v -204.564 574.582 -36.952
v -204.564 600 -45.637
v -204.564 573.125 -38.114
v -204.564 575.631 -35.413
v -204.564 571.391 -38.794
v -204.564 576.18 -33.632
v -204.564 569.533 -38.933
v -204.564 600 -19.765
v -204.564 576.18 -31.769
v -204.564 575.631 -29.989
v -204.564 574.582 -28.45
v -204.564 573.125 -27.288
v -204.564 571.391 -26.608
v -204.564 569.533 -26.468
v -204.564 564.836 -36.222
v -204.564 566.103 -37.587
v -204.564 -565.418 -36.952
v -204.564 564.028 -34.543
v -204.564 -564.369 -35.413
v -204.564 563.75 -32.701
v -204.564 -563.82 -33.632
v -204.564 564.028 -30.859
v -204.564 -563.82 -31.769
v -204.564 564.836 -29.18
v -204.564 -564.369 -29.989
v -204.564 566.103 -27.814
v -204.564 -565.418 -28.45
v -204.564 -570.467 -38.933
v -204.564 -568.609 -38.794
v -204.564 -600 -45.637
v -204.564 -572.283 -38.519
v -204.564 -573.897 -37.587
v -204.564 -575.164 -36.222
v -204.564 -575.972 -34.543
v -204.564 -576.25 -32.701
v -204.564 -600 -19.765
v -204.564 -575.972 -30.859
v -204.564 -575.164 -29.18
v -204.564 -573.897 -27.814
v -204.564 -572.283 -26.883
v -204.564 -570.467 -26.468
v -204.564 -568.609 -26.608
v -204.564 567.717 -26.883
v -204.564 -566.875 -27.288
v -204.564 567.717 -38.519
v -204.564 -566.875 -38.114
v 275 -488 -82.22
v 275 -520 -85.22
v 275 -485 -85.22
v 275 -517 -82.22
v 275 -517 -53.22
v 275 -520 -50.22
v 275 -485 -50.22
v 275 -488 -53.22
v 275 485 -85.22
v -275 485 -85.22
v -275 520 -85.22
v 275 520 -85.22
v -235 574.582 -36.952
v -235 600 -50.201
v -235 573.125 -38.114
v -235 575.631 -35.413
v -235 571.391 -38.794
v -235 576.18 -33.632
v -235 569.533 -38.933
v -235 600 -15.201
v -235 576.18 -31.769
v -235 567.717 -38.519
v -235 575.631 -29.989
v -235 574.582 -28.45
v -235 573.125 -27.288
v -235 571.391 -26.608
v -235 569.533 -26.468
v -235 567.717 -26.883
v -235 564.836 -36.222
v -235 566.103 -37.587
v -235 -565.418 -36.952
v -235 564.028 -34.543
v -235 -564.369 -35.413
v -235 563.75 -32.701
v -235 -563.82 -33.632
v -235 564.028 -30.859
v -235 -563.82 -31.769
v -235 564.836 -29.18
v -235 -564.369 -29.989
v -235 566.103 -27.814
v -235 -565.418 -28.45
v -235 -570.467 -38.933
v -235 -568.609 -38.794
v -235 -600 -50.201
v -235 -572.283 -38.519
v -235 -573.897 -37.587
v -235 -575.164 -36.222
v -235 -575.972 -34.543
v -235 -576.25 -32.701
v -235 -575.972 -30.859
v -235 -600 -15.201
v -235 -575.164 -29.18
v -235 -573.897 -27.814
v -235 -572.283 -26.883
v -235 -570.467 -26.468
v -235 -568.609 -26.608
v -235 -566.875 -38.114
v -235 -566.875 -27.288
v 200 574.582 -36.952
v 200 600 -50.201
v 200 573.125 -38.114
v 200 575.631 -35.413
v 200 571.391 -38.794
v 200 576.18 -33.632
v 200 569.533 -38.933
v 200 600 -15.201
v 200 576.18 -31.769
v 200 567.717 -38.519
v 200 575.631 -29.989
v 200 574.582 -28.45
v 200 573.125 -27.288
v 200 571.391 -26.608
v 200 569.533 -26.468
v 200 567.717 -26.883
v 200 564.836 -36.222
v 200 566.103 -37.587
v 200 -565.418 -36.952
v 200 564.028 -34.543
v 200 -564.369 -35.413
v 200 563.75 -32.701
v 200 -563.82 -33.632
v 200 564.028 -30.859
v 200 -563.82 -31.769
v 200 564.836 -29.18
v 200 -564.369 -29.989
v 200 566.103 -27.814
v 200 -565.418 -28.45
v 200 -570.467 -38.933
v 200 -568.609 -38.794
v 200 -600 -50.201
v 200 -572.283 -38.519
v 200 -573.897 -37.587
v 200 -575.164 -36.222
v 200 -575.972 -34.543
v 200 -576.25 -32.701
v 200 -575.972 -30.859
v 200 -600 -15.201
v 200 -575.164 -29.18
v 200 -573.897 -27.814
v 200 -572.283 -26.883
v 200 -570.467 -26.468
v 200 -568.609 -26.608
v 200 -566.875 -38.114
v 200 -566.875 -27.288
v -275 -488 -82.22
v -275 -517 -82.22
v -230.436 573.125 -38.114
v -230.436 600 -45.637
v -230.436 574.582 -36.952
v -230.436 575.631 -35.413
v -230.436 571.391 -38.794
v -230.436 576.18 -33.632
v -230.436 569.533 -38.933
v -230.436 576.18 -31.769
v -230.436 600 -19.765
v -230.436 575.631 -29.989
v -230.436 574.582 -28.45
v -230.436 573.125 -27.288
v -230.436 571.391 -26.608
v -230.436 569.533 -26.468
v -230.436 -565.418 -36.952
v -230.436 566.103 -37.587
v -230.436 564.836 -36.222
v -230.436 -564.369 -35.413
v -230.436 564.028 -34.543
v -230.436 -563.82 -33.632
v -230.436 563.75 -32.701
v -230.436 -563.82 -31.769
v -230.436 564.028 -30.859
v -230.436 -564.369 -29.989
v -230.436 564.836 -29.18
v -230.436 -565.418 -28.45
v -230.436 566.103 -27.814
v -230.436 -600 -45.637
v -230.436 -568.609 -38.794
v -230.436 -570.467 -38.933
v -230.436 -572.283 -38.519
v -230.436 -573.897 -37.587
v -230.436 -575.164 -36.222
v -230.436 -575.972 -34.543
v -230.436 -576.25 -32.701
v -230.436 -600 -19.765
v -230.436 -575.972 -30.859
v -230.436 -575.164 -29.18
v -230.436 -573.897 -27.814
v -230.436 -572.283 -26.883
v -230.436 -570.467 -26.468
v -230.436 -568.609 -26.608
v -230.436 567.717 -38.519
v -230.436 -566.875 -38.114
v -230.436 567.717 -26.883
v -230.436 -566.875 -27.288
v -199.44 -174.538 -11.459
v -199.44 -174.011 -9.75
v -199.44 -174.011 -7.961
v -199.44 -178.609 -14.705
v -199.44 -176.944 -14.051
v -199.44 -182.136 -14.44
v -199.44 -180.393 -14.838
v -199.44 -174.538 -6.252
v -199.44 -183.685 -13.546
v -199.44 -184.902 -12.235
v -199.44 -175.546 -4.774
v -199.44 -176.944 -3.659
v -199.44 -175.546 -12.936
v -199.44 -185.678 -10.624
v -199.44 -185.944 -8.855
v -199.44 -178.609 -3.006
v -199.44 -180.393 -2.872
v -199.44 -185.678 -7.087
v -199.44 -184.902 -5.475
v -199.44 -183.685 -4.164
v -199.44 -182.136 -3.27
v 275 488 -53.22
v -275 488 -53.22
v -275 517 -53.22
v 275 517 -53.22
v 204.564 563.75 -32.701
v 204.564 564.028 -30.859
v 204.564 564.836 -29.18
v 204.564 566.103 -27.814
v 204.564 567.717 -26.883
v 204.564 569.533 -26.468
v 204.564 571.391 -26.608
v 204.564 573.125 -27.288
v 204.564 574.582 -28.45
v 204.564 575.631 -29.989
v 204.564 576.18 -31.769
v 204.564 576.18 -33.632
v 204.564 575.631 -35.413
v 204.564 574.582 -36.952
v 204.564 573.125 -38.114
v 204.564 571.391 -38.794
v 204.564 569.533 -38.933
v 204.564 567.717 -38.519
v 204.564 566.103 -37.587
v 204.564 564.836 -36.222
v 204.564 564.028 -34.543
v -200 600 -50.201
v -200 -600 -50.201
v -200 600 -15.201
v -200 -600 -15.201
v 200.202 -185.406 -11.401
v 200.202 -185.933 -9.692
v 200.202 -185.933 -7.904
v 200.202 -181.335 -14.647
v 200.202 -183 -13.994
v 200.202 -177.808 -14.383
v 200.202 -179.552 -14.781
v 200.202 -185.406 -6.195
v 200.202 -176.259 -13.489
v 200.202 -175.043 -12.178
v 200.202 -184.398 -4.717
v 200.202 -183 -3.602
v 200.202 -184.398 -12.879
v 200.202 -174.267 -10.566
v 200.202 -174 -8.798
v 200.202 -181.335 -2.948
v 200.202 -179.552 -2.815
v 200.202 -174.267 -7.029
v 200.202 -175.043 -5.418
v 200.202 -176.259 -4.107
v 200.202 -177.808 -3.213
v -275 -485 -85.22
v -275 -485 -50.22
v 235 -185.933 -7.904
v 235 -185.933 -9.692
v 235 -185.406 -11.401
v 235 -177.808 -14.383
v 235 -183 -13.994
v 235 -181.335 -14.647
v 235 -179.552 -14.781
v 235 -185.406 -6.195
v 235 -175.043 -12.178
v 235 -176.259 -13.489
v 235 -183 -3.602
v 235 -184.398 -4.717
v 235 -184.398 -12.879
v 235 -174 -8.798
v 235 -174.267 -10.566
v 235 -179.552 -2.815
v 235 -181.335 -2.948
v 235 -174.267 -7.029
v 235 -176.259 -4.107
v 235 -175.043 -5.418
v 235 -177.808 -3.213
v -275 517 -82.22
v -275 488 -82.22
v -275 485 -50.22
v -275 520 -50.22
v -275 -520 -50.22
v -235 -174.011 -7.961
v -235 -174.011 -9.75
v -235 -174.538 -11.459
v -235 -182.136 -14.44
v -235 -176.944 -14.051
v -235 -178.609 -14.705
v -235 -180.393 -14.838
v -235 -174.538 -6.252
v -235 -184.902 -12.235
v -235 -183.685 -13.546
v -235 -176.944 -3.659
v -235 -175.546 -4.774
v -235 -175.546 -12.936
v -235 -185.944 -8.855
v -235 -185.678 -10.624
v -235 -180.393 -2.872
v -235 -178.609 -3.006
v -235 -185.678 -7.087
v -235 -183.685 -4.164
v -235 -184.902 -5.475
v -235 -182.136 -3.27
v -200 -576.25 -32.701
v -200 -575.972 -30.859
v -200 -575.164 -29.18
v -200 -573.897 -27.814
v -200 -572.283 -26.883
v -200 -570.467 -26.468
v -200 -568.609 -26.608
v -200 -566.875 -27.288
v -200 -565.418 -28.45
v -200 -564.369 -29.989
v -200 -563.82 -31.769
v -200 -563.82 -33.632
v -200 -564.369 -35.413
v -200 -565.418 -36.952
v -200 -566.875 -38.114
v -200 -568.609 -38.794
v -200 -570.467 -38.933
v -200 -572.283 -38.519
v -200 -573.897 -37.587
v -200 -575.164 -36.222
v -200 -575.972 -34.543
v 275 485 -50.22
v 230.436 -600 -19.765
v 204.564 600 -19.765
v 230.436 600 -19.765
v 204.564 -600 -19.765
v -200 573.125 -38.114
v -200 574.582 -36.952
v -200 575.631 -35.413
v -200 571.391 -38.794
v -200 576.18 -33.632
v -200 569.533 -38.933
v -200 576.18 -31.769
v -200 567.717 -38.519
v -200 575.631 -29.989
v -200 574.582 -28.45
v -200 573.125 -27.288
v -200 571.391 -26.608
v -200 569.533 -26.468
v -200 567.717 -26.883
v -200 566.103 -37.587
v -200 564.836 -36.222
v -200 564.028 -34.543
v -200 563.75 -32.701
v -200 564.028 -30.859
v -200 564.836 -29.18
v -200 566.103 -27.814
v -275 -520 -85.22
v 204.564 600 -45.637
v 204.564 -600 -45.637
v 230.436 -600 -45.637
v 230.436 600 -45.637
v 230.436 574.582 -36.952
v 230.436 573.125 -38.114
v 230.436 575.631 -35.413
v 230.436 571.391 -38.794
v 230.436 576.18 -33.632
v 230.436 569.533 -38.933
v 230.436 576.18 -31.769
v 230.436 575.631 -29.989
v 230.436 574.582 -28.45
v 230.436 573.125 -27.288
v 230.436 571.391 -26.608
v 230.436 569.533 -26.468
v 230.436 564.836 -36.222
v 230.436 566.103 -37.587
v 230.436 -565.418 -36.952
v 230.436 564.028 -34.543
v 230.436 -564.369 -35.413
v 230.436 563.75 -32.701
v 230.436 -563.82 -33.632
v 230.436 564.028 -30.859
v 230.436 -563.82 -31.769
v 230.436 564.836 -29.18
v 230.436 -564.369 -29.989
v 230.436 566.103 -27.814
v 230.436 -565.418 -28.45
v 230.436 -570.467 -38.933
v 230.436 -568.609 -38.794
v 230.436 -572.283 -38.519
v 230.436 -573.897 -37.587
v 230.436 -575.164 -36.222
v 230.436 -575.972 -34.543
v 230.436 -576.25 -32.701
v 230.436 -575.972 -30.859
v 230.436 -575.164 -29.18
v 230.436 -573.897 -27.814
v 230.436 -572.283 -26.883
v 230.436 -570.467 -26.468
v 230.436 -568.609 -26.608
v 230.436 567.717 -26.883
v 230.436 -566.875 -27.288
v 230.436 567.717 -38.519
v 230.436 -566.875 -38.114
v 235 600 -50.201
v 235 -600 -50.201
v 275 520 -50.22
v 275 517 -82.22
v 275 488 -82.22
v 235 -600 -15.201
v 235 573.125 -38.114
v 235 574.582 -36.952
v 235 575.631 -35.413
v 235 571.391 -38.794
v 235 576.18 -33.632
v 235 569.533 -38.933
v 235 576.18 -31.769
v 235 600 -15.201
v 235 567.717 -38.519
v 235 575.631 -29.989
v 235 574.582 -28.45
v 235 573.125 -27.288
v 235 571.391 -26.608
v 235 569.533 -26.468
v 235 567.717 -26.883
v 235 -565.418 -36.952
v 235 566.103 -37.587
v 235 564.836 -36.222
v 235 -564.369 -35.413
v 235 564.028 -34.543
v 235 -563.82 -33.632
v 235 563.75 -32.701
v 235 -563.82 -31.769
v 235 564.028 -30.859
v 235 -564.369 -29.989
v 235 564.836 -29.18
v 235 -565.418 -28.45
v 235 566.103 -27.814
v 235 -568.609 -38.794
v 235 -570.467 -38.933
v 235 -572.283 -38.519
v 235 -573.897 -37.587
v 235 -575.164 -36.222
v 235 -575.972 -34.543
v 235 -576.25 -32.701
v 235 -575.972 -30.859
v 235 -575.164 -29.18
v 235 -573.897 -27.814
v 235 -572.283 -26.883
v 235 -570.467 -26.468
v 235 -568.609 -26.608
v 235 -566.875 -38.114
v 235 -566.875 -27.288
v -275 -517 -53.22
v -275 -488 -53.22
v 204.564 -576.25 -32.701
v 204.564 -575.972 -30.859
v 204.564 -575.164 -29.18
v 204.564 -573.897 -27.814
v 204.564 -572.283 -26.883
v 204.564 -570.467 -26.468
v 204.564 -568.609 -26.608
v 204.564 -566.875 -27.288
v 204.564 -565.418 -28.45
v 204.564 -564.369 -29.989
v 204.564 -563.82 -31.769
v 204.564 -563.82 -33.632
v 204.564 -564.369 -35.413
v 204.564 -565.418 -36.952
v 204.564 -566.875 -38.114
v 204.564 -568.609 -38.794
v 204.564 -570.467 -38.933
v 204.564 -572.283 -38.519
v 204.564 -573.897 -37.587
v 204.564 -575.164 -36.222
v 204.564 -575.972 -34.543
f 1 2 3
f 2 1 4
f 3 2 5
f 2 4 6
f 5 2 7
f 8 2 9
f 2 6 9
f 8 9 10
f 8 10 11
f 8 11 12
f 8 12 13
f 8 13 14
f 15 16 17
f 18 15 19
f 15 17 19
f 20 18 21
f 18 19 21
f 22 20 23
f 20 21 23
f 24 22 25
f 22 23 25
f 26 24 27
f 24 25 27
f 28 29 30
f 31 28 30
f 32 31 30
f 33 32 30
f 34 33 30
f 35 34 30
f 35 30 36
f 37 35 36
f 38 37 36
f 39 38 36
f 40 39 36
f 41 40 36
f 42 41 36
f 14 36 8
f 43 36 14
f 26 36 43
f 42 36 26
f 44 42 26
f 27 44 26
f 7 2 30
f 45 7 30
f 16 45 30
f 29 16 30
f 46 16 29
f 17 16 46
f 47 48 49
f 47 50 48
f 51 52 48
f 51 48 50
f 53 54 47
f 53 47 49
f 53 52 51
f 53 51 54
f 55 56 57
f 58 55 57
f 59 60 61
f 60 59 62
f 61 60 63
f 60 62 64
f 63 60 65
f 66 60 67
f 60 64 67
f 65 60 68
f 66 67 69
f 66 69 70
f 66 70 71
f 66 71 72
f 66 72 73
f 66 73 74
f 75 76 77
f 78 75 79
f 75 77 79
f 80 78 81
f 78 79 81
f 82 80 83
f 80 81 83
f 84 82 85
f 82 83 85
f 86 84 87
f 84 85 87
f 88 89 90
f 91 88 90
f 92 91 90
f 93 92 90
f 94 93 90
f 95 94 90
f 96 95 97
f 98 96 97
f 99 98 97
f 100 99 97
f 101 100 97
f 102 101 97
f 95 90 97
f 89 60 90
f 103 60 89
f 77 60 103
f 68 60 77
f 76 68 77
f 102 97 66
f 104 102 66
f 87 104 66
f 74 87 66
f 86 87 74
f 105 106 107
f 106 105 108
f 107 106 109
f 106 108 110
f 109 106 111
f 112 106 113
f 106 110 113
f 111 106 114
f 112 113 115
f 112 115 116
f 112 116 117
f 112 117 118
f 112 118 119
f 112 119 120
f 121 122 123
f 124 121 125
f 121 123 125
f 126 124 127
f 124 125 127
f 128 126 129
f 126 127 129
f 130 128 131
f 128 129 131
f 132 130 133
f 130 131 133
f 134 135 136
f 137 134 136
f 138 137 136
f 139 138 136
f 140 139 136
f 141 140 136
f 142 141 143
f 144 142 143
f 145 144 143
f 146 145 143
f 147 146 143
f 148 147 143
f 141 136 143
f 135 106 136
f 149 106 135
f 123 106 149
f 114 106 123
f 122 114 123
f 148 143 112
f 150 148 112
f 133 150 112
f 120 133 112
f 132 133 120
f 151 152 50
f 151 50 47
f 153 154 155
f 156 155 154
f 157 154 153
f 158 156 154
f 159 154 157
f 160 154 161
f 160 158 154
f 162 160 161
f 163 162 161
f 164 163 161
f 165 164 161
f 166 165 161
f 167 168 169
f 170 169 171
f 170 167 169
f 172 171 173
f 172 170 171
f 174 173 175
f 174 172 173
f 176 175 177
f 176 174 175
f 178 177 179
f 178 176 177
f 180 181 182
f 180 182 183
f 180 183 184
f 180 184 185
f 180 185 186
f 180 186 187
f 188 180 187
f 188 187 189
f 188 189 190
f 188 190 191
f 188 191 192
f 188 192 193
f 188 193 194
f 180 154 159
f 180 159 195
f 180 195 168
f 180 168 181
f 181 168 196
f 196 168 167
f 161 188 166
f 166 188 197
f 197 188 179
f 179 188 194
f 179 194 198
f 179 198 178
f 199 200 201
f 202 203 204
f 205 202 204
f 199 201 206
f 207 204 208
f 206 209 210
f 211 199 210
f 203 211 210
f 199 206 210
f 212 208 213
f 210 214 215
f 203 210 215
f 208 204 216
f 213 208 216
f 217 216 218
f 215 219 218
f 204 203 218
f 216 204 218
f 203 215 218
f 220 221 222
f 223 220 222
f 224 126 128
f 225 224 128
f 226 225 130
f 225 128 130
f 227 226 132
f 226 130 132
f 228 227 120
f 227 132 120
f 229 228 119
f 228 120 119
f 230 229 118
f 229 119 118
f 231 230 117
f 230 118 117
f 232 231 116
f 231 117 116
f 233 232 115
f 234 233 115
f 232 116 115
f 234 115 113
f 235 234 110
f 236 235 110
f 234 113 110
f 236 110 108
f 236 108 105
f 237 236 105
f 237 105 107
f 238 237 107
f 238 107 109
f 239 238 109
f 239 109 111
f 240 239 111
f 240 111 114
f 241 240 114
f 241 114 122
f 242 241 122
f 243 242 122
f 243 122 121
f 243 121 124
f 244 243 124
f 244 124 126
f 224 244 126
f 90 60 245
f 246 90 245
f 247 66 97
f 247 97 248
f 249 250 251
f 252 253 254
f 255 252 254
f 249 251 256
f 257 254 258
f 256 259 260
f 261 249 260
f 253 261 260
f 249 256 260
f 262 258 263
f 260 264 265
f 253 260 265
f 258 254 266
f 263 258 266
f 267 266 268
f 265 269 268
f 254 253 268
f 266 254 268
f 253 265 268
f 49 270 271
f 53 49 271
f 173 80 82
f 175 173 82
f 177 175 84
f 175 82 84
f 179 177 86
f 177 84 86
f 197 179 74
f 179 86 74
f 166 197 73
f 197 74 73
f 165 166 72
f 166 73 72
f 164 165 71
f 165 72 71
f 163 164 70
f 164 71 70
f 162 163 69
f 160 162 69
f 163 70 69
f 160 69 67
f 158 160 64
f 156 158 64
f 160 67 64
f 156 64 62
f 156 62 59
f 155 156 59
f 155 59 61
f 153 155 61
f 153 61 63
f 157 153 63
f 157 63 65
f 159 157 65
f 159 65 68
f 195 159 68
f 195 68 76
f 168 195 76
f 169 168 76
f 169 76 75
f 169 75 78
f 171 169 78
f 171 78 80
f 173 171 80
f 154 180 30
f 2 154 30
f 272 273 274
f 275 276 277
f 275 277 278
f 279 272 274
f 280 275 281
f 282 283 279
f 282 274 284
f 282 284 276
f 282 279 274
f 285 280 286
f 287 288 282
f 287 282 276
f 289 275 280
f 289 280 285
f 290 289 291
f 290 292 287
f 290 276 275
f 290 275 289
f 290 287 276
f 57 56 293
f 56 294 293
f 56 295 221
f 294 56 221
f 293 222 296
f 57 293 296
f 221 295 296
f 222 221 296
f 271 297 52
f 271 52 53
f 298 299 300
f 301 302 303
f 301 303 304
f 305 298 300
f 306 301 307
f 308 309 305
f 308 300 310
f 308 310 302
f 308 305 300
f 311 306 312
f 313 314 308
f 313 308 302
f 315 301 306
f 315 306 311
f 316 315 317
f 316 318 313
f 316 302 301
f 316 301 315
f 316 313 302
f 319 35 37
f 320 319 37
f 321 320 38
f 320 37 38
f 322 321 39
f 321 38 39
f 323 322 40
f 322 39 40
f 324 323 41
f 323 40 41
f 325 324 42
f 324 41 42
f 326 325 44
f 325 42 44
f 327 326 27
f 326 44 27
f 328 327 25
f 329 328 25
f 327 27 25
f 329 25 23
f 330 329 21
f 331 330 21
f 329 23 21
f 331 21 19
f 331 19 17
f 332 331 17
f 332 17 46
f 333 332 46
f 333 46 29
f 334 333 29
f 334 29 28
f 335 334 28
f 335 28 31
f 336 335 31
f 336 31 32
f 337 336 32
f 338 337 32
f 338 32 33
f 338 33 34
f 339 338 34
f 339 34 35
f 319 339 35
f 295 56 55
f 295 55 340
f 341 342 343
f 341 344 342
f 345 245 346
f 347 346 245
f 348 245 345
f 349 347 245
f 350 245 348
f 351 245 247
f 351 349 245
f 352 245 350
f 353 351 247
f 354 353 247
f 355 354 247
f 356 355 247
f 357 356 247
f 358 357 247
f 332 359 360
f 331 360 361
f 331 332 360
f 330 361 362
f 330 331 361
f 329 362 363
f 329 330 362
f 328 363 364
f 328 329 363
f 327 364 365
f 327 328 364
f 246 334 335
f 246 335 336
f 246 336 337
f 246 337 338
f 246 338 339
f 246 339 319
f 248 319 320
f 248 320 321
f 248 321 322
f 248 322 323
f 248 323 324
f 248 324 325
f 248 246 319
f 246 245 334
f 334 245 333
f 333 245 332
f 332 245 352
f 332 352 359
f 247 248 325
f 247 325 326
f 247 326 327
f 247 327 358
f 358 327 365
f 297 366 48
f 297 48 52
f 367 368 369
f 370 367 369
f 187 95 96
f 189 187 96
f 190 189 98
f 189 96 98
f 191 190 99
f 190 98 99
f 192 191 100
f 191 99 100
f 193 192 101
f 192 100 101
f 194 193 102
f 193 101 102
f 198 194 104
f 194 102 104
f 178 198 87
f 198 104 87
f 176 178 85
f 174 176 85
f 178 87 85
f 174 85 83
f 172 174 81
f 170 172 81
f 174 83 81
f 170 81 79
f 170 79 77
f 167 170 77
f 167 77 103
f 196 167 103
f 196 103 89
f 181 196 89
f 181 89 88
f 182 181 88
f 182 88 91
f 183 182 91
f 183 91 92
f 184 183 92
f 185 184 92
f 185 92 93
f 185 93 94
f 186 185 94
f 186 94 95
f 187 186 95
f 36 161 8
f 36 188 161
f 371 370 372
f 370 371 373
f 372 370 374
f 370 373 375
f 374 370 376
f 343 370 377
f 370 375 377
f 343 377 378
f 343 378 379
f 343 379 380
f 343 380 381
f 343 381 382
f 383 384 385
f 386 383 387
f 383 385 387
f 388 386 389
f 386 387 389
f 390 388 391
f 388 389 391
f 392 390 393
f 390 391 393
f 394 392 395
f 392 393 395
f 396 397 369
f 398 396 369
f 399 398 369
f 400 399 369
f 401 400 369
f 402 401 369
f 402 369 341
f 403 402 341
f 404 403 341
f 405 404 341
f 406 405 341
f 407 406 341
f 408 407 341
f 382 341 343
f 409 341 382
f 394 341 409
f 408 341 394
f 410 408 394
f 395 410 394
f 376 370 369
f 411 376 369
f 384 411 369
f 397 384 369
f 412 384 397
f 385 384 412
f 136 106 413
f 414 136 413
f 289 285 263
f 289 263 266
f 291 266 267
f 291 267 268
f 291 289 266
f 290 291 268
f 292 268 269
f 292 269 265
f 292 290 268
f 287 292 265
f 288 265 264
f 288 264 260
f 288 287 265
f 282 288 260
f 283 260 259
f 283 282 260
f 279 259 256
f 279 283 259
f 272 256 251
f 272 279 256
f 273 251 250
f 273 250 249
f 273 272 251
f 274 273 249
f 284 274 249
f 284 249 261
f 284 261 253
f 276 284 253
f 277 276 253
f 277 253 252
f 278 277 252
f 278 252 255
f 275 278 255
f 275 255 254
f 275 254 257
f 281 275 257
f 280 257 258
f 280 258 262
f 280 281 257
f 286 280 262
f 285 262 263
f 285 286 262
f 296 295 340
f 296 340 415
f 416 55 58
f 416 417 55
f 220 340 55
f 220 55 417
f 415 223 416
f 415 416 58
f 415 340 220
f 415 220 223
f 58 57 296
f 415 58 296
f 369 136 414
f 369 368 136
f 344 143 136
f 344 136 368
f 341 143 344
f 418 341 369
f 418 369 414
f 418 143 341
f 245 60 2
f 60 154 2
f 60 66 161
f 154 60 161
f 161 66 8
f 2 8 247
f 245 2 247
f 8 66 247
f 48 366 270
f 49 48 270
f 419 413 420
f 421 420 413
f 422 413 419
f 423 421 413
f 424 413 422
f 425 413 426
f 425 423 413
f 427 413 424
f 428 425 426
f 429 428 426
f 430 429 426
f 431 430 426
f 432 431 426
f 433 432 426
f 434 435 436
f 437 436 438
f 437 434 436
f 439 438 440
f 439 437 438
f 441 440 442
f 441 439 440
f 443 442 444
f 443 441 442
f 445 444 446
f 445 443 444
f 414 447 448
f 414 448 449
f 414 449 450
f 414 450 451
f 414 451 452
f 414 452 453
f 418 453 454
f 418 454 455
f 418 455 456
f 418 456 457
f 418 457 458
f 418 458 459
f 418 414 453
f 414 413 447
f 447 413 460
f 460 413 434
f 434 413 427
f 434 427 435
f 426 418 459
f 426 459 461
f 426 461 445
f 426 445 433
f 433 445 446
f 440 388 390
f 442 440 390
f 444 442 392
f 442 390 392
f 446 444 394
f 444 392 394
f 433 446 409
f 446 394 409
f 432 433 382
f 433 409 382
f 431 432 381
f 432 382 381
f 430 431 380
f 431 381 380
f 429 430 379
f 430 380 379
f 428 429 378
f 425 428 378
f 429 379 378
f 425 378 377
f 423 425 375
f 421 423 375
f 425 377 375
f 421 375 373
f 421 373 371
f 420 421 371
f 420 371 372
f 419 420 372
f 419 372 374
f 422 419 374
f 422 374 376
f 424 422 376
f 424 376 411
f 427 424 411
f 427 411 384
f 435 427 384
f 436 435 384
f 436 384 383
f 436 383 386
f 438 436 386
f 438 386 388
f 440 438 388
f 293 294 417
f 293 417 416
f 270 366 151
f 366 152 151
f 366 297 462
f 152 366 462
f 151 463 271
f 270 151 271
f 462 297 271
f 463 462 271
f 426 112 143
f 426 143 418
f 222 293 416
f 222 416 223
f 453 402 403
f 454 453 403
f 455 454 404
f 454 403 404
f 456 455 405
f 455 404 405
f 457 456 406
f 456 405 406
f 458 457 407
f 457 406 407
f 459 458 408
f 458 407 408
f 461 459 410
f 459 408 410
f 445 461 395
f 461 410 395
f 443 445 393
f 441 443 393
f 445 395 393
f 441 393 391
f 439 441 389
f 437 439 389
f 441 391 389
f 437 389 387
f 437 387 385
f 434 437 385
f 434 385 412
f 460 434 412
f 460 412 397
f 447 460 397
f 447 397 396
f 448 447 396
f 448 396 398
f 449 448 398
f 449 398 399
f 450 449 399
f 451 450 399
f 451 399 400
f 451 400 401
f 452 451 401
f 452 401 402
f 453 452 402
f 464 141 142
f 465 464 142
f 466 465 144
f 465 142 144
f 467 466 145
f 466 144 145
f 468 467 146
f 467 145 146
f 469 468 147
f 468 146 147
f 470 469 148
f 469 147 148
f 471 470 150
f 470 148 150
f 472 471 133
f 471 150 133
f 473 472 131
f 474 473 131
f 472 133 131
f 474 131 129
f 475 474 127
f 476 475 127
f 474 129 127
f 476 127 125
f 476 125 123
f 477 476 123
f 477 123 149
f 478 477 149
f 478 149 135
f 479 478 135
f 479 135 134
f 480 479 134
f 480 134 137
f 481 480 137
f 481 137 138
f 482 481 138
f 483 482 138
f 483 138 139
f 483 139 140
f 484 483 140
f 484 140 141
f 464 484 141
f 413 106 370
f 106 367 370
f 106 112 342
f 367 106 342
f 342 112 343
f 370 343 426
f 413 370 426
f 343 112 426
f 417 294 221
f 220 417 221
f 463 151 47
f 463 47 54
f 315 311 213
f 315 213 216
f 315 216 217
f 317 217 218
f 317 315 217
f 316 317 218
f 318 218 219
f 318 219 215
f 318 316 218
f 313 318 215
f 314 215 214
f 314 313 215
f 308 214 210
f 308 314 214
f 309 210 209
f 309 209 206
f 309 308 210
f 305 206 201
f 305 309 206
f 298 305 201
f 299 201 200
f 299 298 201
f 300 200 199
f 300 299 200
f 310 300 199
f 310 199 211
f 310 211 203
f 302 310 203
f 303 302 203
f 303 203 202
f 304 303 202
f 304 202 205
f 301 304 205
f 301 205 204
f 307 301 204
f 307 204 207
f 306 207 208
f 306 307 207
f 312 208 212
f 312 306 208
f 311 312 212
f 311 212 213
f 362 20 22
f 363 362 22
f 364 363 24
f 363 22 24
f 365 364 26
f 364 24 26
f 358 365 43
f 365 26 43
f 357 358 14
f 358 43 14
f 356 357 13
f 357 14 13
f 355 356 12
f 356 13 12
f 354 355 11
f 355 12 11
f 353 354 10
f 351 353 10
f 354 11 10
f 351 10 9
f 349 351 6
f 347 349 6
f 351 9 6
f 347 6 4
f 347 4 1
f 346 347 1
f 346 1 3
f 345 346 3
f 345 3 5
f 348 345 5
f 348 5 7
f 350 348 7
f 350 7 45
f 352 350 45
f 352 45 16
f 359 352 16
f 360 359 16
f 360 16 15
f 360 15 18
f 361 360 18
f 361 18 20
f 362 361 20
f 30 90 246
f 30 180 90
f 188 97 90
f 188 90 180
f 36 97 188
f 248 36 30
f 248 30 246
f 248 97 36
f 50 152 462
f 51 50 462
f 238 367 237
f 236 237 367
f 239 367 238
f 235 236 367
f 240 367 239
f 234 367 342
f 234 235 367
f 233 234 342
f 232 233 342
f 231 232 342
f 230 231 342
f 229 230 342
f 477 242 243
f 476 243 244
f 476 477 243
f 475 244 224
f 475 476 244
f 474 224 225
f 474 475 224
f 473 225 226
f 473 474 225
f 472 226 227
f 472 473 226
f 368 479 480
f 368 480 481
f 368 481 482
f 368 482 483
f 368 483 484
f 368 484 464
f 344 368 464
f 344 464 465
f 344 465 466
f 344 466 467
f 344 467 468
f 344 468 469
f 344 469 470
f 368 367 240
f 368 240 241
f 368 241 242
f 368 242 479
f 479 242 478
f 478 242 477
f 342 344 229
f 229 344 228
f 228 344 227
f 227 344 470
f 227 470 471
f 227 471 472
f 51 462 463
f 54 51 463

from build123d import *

# Parameters (mm, degrees)
F0_W      = 35
F0_H      = 35
F0_W_2    = 25.8728711307
F0_H_2    = 25.8728711307
F2_DEPTH  = 600
F1_W      = 35
F1_H      = 35
F1_W_2    = 29
F1_H_2    = 29
F3_DEPTH  = 275
F4_R      = 6.25
F5_DEPTH  = 501.65
F6_R      = 6.25
F7_DEPTH  = 39.37
F8_R      = 6
F9_DEPTH  = 34.798
F10_R     = 6
F11_DEPTH = 35.56


with BuildPart() as f2:
    # F0 (on Front) → F2 (new body, symmetric)
    with BuildSketch(Plane.XZ):
        with Locations((-217.5, -32.7009419724)):
            Rectangle(F0_W, F0_H)
        with Locations((-217.5, -32.7009419724)):
            Rectangle(F0_W_2, F0_H_2, mode=Mode.SUBTRACT)
    extrude(amount=F2_DEPTH, both=True)


with BuildPart() as f2b:
    # F0 (on Front) → F2, piece 2 (new body, symmetric)
    with BuildSketch(Plane.XZ):
        with Locations((217.5, -32.7009419724)):
            Rectangle(F0_W, F0_H)
        with Locations((217.5, -32.7009419724)):
            Rectangle(F0_W_2, F0_H_2, mode=Mode.SUBTRACT)
    extrude(amount=F2_DEPTH, both=True)


with BuildPart() as f3:
    # F1 (on Right) → F3 (new body, symmetric)
    with BuildSketch(Plane.YZ):
        with Locations((502.5, -67.7200500667)):
            Rectangle(F1_W, F1_H)
        with Locations((502.5, -67.7200500667)):
            Rectangle(F1_W_2, F1_H_2, mode=Mode.SUBTRACT)
    extrude(amount=F3_DEPTH, both=True)


with BuildPart() as f3b:
    # F1 (on Right) → F3, piece 2 (new body, symmetric)
    with BuildSketch(Plane.YZ):
        with Locations((-502.5, -67.7200500667)):
            Rectangle(F1_W, F1_H)
        with Locations((-502.5, -67.7200500667)):
            Rectangle(F1_W_2, F1_H_2, mode=Mode.SUBTRACT)
    extrude(amount=F3_DEPTH, both=True)


with BuildPart() as f5_tool:
    # F4 (on face) → F5 (new body)
    with BuildSketch(Plane(origin=(-235, 0, 0), x_dir=(0, -1, 0), z_dir=(-1, 0, 0))):
        with Locations((-570, -32.7009419724)):
            Circle(F4_R)
        with Locations((570, -32.7009419724)):
            Circle(F4_R)
    extrude(amount=-F5_DEPTH)


with BuildPart() as f2_1:
    add(f2.part)

    # F5: cut by f5_tool
    add(f5_tool.part, mode=Mode.SUBTRACT)

    # F6 (on face) → F7 (cut)
    with BuildSketch(Plane.YZ.offset(235)):
        with Locations((-570, -32.7009419724)):
            Circle(F6_R)
        with Locations((570, -32.7009419724)):
            Circle(F6_R)
    extrude(amount=-F7_DEPTH, mode=Mode.SUBTRACT)


with BuildPart() as f2b_1:
    add(f2b.part)

    # F5: cut by f5_tool
    add(f5_tool.part, mode=Mode.SUBTRACT)


with BuildPart() as f9:
    # F8 (on face) → F9 (new body)
    with BuildSketch(Plane.YZ.offset(235)):
        with Locations((-180, -8.7979223349)):
            Circle(F8_R)
    extrude(amount=-F9_DEPTH)


with BuildPart() as f11:
    # F10 (on face) → F11 (new body)
    with BuildSketch(Plane(origin=(-235, 0, 0), x_dir=(0, -1, 0), z_dir=(-1, 0, 0))):
        with Locations((179.9442470074, -8.8552506641)):
            Circle(F10_R)
    extrude(amount=-F11_DEPTH)


solid = Compound([f3.part, f3b.part, f2_1.part, f2b_1.part, f9.part, f11.part])
